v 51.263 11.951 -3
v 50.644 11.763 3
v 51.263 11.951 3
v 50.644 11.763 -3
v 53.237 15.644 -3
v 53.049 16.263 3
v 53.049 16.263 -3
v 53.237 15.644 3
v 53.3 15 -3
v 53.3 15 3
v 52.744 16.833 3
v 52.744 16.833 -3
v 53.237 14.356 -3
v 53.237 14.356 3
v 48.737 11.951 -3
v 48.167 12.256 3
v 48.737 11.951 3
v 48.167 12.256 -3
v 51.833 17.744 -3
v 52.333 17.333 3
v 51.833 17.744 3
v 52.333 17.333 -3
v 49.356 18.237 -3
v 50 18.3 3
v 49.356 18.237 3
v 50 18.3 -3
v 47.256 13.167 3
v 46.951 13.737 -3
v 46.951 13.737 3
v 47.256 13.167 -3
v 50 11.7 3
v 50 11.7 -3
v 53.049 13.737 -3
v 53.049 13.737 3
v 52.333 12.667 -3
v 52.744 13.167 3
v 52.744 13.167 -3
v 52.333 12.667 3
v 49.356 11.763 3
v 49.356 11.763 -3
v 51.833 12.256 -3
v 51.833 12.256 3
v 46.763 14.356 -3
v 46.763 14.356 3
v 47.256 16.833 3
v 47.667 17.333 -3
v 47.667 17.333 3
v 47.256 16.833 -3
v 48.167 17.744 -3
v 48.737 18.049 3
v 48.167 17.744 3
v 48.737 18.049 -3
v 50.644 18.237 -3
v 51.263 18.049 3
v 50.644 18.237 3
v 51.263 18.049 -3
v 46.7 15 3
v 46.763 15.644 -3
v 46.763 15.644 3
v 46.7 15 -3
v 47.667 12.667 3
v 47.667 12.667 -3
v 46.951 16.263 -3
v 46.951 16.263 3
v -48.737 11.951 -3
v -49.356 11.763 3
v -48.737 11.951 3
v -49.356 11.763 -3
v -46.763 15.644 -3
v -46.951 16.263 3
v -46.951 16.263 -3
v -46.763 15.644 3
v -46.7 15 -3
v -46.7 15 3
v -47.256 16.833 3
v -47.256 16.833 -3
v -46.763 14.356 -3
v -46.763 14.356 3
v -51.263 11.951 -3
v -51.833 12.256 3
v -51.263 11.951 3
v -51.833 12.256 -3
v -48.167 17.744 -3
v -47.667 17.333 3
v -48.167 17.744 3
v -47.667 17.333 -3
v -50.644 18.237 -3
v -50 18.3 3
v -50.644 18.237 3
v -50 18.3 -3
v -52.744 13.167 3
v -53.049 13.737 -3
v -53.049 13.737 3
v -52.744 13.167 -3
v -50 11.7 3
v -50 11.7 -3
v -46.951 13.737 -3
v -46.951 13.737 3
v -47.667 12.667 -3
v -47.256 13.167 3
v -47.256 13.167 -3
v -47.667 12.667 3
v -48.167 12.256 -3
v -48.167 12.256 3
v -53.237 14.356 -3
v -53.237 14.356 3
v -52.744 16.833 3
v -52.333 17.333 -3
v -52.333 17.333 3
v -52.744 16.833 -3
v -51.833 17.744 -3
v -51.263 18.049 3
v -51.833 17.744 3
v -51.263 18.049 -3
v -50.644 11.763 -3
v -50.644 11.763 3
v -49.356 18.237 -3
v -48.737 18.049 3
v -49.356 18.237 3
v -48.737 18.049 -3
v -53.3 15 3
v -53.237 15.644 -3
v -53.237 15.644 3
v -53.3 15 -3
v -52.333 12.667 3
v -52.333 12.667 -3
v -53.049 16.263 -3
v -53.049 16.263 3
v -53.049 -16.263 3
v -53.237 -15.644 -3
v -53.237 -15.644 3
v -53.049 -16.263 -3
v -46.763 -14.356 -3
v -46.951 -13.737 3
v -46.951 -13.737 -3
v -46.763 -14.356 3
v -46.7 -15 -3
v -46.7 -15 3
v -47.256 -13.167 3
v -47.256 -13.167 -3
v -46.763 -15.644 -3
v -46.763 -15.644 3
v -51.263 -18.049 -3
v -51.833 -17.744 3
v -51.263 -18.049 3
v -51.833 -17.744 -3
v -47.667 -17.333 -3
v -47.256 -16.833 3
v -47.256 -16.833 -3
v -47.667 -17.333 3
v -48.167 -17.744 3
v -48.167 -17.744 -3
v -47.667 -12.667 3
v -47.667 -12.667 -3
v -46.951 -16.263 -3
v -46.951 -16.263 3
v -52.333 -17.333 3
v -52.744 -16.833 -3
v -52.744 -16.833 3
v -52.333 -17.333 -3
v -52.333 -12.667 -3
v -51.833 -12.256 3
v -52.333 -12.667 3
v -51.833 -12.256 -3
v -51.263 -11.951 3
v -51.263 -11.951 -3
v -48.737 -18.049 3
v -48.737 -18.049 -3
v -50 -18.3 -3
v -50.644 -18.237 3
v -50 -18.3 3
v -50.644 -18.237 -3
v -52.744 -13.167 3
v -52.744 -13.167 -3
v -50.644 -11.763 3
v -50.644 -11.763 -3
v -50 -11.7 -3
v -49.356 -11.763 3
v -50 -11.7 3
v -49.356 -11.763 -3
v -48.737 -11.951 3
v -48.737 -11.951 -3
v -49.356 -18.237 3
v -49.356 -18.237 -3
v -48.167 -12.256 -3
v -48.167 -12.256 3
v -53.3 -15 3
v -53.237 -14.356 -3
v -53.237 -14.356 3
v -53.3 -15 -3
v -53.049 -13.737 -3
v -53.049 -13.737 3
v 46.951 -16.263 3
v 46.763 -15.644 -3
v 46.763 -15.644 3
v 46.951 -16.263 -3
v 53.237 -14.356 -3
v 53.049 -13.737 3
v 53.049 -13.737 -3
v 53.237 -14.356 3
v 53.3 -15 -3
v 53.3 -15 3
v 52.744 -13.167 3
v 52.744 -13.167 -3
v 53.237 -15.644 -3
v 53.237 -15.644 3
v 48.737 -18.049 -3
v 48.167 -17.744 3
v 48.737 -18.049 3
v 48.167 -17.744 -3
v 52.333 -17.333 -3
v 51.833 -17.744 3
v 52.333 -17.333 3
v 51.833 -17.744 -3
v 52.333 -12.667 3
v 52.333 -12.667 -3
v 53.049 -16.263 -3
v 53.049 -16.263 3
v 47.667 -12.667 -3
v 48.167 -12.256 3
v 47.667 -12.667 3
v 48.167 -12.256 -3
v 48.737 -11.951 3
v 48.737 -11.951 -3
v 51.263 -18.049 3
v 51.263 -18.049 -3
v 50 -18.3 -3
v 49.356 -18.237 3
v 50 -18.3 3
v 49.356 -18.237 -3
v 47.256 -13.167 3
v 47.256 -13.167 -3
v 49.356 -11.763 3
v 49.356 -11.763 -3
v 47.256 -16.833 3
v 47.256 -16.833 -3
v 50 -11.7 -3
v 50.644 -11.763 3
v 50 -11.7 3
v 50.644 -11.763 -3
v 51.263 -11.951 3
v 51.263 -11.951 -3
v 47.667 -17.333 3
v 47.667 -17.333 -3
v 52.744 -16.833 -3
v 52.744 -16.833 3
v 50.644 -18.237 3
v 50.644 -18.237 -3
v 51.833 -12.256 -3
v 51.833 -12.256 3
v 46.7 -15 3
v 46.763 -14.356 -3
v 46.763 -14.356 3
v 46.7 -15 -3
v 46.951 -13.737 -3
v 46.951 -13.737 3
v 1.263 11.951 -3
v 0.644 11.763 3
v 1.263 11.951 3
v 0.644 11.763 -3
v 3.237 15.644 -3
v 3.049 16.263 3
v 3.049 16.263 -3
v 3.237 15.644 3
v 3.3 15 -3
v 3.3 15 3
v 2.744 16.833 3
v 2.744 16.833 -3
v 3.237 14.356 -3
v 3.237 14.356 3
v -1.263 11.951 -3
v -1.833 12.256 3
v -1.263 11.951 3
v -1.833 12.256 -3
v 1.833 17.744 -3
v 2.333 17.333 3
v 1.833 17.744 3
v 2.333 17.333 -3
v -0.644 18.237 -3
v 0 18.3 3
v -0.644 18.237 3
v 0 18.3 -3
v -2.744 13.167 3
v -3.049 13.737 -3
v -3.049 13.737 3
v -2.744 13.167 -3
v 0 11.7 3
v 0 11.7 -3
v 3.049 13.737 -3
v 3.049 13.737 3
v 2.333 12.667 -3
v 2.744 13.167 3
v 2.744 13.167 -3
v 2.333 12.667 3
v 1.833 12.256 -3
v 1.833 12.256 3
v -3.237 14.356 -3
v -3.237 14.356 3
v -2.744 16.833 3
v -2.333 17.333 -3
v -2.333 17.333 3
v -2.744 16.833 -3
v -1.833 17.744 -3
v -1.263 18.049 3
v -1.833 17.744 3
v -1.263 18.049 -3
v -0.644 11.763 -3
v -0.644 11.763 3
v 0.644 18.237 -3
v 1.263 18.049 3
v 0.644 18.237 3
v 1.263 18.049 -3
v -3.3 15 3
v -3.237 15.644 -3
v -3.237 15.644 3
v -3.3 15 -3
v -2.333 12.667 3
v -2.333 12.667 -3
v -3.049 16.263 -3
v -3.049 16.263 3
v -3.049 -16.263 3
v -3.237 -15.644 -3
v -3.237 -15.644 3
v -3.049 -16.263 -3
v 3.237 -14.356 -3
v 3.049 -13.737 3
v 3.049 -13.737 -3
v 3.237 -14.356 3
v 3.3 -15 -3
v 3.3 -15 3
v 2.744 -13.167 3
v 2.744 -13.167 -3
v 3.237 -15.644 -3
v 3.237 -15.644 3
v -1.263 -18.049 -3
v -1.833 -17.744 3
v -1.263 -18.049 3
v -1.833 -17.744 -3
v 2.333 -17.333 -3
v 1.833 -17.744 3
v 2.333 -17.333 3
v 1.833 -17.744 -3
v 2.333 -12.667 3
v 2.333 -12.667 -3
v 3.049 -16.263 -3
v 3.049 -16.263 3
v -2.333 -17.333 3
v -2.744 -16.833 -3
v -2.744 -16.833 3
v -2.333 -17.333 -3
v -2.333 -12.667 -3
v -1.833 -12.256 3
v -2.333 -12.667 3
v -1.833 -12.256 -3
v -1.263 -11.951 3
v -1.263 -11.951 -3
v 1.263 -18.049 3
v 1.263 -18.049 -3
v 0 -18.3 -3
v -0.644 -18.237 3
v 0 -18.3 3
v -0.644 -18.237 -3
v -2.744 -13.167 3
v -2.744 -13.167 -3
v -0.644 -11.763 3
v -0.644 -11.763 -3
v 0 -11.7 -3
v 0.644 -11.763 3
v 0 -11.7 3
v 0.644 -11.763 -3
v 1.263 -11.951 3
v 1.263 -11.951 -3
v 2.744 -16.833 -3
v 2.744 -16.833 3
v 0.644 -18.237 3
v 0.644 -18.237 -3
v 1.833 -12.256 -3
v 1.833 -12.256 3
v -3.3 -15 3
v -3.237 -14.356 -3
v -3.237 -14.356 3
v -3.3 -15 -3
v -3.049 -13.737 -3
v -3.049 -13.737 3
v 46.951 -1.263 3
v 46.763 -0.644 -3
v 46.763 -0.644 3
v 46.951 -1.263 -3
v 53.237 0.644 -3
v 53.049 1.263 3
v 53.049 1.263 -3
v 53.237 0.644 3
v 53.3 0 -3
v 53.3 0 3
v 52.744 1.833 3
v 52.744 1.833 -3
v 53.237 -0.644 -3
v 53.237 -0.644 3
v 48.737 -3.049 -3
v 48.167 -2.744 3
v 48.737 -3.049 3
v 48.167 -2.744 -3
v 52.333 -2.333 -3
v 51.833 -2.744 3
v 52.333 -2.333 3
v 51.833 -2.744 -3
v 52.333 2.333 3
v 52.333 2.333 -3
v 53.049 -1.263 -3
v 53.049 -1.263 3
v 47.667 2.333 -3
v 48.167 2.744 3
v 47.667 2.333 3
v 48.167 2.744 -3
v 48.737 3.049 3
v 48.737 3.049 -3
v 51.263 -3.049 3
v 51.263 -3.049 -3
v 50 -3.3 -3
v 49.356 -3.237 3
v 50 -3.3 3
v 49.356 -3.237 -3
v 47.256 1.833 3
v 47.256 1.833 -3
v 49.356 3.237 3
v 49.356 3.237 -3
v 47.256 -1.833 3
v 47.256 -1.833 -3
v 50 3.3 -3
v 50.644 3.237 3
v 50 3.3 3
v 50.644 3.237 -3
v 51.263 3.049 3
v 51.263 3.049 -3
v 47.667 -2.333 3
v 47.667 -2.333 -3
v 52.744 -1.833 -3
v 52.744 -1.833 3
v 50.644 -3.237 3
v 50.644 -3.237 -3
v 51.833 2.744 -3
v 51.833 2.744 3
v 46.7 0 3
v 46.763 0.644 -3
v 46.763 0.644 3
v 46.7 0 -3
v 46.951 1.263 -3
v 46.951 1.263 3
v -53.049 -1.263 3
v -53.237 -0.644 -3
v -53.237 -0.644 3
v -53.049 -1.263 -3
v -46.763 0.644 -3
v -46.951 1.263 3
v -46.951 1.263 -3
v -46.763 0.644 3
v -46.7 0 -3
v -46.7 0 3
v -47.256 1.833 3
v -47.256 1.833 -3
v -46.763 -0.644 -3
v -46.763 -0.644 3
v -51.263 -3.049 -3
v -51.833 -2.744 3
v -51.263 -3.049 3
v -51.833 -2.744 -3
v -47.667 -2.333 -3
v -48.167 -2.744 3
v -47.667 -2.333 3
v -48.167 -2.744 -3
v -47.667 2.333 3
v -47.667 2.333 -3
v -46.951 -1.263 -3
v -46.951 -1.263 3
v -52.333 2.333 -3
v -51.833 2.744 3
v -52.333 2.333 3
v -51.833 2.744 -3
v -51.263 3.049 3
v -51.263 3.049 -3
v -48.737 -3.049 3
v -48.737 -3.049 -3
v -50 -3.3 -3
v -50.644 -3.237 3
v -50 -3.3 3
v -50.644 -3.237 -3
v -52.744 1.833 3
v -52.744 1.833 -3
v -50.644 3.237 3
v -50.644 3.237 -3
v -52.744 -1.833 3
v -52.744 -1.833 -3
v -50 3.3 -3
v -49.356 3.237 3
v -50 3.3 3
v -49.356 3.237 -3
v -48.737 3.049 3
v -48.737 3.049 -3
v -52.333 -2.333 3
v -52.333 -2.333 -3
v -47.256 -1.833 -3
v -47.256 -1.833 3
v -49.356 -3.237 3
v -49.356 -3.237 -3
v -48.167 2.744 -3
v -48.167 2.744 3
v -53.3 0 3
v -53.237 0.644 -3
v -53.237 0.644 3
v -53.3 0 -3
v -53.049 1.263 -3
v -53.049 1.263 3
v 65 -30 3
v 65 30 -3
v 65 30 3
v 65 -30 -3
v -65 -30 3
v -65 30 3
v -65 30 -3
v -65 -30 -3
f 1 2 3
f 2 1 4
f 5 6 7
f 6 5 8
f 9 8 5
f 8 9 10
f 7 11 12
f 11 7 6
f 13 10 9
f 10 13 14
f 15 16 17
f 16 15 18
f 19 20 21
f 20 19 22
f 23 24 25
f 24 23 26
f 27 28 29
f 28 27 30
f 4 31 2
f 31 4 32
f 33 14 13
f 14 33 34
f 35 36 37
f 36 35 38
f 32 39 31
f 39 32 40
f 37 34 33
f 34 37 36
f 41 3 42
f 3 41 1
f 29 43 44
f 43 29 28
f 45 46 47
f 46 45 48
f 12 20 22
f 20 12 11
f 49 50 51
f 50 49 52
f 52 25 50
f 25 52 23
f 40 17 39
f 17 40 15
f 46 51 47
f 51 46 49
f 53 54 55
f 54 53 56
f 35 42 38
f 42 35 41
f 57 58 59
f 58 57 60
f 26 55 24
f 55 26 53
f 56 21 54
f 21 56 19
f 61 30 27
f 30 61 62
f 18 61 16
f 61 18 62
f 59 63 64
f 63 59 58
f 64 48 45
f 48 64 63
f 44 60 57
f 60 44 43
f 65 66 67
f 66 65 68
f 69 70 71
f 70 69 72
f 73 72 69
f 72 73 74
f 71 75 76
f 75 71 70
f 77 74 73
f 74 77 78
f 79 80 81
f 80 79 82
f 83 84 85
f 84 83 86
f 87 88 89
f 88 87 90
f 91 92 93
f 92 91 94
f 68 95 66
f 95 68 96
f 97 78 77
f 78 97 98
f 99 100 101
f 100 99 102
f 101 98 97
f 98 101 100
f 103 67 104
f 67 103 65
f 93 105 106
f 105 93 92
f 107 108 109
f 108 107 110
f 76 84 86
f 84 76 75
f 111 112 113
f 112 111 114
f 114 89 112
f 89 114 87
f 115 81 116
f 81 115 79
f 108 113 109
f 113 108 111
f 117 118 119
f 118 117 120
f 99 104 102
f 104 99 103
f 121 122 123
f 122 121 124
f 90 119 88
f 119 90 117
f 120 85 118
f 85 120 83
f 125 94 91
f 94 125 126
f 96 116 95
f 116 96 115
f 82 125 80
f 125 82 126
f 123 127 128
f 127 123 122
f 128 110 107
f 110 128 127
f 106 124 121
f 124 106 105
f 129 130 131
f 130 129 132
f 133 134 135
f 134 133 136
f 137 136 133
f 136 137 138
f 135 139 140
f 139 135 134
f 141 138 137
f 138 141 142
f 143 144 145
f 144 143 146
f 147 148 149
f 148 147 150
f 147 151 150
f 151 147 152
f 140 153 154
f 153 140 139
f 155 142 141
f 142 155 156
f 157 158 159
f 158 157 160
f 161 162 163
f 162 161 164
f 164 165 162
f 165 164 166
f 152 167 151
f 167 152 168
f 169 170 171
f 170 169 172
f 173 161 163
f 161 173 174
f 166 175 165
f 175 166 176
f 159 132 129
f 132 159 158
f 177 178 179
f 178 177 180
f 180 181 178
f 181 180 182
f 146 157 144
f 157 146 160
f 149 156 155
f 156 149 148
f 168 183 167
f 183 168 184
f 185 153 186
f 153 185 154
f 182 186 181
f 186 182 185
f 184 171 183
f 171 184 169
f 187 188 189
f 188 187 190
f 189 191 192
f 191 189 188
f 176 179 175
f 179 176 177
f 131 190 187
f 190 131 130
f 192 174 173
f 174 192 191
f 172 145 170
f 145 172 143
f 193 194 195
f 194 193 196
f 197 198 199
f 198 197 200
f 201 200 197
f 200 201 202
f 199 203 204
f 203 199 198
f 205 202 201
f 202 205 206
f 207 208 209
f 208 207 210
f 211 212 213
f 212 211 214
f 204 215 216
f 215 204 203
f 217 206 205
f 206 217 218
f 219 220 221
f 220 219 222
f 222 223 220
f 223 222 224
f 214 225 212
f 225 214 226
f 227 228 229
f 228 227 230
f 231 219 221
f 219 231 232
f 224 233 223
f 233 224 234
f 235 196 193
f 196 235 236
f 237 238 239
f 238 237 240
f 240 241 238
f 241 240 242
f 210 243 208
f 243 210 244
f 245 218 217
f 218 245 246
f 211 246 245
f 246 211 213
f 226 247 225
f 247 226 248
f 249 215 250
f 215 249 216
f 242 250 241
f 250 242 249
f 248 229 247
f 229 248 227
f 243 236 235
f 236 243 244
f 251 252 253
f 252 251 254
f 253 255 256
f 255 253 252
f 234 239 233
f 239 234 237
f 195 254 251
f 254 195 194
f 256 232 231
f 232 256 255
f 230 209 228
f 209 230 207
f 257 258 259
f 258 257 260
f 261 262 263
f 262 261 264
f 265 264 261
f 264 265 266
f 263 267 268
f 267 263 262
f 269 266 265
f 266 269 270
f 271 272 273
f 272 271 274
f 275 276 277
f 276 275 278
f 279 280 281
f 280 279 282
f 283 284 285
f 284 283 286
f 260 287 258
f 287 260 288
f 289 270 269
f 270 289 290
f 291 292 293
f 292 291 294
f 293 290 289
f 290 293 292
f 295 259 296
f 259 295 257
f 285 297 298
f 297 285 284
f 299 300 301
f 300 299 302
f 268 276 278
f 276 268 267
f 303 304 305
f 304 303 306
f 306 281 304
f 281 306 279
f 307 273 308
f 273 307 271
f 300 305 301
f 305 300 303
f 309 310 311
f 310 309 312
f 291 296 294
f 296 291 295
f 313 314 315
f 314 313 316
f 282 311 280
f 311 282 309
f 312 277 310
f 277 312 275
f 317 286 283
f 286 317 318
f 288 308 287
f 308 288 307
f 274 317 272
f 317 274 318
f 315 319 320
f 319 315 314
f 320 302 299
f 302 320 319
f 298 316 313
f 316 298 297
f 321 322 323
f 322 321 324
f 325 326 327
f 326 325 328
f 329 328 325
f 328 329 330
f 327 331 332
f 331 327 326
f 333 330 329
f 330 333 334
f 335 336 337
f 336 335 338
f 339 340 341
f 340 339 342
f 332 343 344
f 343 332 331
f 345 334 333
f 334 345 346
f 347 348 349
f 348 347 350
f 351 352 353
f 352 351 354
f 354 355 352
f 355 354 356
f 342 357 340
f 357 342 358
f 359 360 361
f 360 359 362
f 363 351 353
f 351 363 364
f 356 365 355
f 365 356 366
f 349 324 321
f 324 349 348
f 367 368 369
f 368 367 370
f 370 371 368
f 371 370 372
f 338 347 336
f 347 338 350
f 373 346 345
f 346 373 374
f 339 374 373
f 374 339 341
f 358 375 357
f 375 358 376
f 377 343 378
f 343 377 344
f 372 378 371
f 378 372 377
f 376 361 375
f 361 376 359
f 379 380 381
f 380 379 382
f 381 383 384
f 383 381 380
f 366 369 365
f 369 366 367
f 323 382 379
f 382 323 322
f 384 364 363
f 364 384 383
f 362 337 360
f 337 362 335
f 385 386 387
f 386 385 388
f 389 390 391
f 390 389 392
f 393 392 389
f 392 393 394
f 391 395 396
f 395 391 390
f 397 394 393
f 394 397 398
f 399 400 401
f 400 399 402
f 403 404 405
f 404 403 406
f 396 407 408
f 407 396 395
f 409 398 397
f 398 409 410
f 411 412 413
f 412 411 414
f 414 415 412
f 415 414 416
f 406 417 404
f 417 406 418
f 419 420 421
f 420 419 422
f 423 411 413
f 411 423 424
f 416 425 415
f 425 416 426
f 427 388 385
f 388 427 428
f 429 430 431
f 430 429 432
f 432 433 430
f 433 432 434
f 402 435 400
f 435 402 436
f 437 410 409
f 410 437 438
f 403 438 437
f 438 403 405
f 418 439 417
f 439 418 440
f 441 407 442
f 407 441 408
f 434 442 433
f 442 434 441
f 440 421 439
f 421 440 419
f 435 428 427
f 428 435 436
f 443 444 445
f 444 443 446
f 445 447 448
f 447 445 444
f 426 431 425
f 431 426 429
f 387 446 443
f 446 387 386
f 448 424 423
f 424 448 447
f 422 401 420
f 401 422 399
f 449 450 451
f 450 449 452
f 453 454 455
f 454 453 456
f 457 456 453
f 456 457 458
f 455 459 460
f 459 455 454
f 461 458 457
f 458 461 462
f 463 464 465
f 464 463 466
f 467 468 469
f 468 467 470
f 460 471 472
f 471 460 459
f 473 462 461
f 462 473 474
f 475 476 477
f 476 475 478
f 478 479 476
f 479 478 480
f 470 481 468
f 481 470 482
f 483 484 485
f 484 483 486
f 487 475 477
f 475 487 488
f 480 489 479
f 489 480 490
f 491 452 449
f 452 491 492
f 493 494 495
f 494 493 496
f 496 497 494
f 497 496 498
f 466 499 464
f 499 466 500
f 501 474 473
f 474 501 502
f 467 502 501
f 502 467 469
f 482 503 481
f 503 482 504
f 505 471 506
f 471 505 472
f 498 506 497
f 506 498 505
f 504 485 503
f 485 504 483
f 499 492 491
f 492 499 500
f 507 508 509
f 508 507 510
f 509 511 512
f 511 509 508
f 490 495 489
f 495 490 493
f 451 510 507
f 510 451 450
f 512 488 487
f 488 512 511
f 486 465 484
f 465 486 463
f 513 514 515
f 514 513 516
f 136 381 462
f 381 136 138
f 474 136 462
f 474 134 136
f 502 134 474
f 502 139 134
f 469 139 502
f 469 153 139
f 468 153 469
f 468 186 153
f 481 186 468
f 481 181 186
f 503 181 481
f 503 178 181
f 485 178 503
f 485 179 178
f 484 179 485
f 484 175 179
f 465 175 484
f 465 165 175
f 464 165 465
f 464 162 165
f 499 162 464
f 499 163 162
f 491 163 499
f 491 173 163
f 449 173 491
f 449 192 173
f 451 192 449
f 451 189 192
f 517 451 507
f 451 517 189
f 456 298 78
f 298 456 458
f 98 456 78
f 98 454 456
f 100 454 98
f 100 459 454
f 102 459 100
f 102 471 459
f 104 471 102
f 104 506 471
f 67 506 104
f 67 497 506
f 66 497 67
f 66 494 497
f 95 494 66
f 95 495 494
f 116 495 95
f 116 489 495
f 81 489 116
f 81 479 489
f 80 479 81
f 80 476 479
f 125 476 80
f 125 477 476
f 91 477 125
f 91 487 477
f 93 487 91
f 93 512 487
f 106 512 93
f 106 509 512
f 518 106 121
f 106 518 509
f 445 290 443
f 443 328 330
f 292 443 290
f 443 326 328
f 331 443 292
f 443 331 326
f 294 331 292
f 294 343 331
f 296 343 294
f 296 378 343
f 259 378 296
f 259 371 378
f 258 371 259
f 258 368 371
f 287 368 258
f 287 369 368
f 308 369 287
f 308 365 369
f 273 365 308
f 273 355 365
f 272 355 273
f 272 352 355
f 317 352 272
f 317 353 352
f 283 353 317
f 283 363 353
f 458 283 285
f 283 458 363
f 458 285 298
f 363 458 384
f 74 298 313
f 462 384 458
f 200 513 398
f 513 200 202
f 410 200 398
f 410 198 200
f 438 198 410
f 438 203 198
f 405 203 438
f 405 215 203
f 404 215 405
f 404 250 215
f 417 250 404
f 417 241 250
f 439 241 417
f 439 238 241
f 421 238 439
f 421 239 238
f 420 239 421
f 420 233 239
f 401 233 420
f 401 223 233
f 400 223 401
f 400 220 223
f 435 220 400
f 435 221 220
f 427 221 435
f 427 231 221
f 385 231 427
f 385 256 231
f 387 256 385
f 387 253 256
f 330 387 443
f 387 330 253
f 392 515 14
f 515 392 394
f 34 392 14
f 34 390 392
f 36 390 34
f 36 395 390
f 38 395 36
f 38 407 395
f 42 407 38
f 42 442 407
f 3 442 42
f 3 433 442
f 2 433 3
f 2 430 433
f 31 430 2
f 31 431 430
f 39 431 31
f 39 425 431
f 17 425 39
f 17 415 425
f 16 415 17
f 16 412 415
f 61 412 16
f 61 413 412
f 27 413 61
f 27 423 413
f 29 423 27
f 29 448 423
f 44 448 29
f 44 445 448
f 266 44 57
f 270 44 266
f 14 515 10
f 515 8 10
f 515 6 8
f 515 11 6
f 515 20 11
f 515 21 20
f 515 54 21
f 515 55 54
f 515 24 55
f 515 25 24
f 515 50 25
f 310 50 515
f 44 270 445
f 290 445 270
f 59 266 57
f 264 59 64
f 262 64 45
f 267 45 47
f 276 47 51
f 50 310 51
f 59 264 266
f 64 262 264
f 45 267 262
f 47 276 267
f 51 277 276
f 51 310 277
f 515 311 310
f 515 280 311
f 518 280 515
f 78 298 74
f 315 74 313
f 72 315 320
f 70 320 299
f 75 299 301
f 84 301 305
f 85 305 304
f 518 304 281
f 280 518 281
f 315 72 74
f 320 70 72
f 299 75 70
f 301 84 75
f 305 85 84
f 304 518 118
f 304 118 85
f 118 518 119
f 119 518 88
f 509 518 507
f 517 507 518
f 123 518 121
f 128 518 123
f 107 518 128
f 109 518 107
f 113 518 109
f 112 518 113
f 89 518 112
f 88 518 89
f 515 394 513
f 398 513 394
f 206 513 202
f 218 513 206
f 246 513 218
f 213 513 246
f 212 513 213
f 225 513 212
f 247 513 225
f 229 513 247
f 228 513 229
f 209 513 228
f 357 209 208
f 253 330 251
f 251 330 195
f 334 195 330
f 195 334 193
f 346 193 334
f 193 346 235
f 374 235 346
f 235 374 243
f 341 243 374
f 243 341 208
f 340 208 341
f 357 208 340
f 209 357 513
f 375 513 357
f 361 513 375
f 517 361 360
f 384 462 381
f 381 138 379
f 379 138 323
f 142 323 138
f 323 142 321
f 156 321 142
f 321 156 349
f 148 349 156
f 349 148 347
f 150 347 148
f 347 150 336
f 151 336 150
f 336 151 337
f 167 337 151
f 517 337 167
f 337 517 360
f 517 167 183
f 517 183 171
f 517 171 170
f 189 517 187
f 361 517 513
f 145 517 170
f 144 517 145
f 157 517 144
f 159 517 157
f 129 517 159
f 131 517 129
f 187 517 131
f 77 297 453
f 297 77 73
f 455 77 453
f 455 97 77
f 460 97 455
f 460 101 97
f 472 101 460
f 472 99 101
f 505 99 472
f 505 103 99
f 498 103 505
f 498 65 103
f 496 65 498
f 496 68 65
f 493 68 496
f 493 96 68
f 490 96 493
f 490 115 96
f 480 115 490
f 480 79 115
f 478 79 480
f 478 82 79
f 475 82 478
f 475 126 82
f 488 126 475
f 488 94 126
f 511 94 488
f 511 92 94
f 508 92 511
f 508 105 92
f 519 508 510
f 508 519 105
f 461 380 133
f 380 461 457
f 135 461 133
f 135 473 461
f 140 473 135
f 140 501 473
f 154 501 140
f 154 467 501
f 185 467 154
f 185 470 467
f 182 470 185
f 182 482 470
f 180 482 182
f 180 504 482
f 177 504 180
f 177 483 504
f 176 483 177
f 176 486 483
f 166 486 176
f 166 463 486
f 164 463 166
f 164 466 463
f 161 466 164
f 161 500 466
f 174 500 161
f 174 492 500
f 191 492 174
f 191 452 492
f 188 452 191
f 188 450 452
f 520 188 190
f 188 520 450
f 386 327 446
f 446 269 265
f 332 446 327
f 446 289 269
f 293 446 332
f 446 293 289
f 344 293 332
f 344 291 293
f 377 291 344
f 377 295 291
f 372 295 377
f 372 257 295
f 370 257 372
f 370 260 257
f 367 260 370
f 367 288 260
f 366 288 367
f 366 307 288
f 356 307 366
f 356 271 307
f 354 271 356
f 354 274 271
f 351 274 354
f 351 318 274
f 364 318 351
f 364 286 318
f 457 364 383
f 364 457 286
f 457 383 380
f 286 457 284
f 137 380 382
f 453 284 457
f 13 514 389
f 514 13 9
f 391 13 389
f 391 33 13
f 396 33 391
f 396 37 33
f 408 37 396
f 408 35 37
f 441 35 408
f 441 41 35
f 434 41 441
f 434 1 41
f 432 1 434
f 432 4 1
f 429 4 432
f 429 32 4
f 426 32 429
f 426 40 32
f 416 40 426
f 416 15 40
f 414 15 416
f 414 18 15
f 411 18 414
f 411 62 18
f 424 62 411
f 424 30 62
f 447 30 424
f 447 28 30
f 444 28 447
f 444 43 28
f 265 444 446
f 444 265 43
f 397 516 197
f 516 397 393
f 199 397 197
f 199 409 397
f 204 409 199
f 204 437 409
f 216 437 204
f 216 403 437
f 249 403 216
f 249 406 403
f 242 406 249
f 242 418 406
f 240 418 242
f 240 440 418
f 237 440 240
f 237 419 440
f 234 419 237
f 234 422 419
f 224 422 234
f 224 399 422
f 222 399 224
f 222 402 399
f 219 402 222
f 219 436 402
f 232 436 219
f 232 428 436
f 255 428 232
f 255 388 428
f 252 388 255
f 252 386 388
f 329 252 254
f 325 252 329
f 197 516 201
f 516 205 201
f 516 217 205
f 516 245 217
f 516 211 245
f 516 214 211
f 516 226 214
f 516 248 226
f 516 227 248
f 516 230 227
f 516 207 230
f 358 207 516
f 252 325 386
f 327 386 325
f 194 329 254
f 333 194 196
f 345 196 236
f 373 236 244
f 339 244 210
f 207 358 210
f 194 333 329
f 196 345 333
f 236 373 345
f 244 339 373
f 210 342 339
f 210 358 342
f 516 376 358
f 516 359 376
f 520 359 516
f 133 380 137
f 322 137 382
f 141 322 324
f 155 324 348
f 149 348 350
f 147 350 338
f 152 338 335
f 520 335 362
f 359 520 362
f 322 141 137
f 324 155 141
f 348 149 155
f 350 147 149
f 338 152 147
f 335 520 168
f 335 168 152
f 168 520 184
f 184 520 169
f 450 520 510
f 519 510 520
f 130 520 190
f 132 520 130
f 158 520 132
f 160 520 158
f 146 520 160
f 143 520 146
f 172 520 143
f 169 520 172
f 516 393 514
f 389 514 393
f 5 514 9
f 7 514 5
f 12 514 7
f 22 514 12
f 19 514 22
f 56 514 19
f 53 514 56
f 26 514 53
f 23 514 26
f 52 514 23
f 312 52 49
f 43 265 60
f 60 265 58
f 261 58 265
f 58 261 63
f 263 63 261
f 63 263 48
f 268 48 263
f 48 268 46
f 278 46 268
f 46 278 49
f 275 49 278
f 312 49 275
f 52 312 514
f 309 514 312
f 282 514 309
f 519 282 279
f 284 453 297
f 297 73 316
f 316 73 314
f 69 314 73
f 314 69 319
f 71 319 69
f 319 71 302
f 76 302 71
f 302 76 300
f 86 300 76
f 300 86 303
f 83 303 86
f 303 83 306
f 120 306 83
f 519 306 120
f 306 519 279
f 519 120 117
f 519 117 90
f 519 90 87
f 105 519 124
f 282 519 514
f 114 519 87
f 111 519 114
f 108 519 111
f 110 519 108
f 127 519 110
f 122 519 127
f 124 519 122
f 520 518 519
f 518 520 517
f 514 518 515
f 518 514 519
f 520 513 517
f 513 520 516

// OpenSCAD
$fn = 32;

// ----------------------------------------------------------------------
// Corner plate 130 x 60 x 6
// 8 holes, centres taken from the edge offset
// ----------------------------------------------------------------------

// --- parameters (mm) ---
plate = [130, 60, 6];  // overall size (x, y, z)
holes = 8;             // number of holes the drawing asks for
hole_d = 6.6;          // hole diameter
edge = 15;             // hole centre offset from the plate edge

// --- derived feature positions (mm) ---
corner_x = plate[0] / 2 - edge;  // = 50   corner hole X
corner_y = plate[1] / 2 - edge;  // = 15   corner hole Y
feature_centers = [
  [corner_x, corner_y],
  [-corner_x, corner_y],
  [-corner_x, -corner_y],
  [corner_x, -corner_y],
  [0, corner_y],
  [0, -corner_y],
  [corner_x, 0],
  [-corner_x, 0]
];   // hole centres the loop below drills

// plate outline, every hole drilled through with the same cutters
difference() {
  cube(plate, center = true);
  for (centre = feature_centers)
    translate([centre[0], centre[1], 0])
      cylinder(d = hole_d, h = plate[2] + 2, center = true);
}
